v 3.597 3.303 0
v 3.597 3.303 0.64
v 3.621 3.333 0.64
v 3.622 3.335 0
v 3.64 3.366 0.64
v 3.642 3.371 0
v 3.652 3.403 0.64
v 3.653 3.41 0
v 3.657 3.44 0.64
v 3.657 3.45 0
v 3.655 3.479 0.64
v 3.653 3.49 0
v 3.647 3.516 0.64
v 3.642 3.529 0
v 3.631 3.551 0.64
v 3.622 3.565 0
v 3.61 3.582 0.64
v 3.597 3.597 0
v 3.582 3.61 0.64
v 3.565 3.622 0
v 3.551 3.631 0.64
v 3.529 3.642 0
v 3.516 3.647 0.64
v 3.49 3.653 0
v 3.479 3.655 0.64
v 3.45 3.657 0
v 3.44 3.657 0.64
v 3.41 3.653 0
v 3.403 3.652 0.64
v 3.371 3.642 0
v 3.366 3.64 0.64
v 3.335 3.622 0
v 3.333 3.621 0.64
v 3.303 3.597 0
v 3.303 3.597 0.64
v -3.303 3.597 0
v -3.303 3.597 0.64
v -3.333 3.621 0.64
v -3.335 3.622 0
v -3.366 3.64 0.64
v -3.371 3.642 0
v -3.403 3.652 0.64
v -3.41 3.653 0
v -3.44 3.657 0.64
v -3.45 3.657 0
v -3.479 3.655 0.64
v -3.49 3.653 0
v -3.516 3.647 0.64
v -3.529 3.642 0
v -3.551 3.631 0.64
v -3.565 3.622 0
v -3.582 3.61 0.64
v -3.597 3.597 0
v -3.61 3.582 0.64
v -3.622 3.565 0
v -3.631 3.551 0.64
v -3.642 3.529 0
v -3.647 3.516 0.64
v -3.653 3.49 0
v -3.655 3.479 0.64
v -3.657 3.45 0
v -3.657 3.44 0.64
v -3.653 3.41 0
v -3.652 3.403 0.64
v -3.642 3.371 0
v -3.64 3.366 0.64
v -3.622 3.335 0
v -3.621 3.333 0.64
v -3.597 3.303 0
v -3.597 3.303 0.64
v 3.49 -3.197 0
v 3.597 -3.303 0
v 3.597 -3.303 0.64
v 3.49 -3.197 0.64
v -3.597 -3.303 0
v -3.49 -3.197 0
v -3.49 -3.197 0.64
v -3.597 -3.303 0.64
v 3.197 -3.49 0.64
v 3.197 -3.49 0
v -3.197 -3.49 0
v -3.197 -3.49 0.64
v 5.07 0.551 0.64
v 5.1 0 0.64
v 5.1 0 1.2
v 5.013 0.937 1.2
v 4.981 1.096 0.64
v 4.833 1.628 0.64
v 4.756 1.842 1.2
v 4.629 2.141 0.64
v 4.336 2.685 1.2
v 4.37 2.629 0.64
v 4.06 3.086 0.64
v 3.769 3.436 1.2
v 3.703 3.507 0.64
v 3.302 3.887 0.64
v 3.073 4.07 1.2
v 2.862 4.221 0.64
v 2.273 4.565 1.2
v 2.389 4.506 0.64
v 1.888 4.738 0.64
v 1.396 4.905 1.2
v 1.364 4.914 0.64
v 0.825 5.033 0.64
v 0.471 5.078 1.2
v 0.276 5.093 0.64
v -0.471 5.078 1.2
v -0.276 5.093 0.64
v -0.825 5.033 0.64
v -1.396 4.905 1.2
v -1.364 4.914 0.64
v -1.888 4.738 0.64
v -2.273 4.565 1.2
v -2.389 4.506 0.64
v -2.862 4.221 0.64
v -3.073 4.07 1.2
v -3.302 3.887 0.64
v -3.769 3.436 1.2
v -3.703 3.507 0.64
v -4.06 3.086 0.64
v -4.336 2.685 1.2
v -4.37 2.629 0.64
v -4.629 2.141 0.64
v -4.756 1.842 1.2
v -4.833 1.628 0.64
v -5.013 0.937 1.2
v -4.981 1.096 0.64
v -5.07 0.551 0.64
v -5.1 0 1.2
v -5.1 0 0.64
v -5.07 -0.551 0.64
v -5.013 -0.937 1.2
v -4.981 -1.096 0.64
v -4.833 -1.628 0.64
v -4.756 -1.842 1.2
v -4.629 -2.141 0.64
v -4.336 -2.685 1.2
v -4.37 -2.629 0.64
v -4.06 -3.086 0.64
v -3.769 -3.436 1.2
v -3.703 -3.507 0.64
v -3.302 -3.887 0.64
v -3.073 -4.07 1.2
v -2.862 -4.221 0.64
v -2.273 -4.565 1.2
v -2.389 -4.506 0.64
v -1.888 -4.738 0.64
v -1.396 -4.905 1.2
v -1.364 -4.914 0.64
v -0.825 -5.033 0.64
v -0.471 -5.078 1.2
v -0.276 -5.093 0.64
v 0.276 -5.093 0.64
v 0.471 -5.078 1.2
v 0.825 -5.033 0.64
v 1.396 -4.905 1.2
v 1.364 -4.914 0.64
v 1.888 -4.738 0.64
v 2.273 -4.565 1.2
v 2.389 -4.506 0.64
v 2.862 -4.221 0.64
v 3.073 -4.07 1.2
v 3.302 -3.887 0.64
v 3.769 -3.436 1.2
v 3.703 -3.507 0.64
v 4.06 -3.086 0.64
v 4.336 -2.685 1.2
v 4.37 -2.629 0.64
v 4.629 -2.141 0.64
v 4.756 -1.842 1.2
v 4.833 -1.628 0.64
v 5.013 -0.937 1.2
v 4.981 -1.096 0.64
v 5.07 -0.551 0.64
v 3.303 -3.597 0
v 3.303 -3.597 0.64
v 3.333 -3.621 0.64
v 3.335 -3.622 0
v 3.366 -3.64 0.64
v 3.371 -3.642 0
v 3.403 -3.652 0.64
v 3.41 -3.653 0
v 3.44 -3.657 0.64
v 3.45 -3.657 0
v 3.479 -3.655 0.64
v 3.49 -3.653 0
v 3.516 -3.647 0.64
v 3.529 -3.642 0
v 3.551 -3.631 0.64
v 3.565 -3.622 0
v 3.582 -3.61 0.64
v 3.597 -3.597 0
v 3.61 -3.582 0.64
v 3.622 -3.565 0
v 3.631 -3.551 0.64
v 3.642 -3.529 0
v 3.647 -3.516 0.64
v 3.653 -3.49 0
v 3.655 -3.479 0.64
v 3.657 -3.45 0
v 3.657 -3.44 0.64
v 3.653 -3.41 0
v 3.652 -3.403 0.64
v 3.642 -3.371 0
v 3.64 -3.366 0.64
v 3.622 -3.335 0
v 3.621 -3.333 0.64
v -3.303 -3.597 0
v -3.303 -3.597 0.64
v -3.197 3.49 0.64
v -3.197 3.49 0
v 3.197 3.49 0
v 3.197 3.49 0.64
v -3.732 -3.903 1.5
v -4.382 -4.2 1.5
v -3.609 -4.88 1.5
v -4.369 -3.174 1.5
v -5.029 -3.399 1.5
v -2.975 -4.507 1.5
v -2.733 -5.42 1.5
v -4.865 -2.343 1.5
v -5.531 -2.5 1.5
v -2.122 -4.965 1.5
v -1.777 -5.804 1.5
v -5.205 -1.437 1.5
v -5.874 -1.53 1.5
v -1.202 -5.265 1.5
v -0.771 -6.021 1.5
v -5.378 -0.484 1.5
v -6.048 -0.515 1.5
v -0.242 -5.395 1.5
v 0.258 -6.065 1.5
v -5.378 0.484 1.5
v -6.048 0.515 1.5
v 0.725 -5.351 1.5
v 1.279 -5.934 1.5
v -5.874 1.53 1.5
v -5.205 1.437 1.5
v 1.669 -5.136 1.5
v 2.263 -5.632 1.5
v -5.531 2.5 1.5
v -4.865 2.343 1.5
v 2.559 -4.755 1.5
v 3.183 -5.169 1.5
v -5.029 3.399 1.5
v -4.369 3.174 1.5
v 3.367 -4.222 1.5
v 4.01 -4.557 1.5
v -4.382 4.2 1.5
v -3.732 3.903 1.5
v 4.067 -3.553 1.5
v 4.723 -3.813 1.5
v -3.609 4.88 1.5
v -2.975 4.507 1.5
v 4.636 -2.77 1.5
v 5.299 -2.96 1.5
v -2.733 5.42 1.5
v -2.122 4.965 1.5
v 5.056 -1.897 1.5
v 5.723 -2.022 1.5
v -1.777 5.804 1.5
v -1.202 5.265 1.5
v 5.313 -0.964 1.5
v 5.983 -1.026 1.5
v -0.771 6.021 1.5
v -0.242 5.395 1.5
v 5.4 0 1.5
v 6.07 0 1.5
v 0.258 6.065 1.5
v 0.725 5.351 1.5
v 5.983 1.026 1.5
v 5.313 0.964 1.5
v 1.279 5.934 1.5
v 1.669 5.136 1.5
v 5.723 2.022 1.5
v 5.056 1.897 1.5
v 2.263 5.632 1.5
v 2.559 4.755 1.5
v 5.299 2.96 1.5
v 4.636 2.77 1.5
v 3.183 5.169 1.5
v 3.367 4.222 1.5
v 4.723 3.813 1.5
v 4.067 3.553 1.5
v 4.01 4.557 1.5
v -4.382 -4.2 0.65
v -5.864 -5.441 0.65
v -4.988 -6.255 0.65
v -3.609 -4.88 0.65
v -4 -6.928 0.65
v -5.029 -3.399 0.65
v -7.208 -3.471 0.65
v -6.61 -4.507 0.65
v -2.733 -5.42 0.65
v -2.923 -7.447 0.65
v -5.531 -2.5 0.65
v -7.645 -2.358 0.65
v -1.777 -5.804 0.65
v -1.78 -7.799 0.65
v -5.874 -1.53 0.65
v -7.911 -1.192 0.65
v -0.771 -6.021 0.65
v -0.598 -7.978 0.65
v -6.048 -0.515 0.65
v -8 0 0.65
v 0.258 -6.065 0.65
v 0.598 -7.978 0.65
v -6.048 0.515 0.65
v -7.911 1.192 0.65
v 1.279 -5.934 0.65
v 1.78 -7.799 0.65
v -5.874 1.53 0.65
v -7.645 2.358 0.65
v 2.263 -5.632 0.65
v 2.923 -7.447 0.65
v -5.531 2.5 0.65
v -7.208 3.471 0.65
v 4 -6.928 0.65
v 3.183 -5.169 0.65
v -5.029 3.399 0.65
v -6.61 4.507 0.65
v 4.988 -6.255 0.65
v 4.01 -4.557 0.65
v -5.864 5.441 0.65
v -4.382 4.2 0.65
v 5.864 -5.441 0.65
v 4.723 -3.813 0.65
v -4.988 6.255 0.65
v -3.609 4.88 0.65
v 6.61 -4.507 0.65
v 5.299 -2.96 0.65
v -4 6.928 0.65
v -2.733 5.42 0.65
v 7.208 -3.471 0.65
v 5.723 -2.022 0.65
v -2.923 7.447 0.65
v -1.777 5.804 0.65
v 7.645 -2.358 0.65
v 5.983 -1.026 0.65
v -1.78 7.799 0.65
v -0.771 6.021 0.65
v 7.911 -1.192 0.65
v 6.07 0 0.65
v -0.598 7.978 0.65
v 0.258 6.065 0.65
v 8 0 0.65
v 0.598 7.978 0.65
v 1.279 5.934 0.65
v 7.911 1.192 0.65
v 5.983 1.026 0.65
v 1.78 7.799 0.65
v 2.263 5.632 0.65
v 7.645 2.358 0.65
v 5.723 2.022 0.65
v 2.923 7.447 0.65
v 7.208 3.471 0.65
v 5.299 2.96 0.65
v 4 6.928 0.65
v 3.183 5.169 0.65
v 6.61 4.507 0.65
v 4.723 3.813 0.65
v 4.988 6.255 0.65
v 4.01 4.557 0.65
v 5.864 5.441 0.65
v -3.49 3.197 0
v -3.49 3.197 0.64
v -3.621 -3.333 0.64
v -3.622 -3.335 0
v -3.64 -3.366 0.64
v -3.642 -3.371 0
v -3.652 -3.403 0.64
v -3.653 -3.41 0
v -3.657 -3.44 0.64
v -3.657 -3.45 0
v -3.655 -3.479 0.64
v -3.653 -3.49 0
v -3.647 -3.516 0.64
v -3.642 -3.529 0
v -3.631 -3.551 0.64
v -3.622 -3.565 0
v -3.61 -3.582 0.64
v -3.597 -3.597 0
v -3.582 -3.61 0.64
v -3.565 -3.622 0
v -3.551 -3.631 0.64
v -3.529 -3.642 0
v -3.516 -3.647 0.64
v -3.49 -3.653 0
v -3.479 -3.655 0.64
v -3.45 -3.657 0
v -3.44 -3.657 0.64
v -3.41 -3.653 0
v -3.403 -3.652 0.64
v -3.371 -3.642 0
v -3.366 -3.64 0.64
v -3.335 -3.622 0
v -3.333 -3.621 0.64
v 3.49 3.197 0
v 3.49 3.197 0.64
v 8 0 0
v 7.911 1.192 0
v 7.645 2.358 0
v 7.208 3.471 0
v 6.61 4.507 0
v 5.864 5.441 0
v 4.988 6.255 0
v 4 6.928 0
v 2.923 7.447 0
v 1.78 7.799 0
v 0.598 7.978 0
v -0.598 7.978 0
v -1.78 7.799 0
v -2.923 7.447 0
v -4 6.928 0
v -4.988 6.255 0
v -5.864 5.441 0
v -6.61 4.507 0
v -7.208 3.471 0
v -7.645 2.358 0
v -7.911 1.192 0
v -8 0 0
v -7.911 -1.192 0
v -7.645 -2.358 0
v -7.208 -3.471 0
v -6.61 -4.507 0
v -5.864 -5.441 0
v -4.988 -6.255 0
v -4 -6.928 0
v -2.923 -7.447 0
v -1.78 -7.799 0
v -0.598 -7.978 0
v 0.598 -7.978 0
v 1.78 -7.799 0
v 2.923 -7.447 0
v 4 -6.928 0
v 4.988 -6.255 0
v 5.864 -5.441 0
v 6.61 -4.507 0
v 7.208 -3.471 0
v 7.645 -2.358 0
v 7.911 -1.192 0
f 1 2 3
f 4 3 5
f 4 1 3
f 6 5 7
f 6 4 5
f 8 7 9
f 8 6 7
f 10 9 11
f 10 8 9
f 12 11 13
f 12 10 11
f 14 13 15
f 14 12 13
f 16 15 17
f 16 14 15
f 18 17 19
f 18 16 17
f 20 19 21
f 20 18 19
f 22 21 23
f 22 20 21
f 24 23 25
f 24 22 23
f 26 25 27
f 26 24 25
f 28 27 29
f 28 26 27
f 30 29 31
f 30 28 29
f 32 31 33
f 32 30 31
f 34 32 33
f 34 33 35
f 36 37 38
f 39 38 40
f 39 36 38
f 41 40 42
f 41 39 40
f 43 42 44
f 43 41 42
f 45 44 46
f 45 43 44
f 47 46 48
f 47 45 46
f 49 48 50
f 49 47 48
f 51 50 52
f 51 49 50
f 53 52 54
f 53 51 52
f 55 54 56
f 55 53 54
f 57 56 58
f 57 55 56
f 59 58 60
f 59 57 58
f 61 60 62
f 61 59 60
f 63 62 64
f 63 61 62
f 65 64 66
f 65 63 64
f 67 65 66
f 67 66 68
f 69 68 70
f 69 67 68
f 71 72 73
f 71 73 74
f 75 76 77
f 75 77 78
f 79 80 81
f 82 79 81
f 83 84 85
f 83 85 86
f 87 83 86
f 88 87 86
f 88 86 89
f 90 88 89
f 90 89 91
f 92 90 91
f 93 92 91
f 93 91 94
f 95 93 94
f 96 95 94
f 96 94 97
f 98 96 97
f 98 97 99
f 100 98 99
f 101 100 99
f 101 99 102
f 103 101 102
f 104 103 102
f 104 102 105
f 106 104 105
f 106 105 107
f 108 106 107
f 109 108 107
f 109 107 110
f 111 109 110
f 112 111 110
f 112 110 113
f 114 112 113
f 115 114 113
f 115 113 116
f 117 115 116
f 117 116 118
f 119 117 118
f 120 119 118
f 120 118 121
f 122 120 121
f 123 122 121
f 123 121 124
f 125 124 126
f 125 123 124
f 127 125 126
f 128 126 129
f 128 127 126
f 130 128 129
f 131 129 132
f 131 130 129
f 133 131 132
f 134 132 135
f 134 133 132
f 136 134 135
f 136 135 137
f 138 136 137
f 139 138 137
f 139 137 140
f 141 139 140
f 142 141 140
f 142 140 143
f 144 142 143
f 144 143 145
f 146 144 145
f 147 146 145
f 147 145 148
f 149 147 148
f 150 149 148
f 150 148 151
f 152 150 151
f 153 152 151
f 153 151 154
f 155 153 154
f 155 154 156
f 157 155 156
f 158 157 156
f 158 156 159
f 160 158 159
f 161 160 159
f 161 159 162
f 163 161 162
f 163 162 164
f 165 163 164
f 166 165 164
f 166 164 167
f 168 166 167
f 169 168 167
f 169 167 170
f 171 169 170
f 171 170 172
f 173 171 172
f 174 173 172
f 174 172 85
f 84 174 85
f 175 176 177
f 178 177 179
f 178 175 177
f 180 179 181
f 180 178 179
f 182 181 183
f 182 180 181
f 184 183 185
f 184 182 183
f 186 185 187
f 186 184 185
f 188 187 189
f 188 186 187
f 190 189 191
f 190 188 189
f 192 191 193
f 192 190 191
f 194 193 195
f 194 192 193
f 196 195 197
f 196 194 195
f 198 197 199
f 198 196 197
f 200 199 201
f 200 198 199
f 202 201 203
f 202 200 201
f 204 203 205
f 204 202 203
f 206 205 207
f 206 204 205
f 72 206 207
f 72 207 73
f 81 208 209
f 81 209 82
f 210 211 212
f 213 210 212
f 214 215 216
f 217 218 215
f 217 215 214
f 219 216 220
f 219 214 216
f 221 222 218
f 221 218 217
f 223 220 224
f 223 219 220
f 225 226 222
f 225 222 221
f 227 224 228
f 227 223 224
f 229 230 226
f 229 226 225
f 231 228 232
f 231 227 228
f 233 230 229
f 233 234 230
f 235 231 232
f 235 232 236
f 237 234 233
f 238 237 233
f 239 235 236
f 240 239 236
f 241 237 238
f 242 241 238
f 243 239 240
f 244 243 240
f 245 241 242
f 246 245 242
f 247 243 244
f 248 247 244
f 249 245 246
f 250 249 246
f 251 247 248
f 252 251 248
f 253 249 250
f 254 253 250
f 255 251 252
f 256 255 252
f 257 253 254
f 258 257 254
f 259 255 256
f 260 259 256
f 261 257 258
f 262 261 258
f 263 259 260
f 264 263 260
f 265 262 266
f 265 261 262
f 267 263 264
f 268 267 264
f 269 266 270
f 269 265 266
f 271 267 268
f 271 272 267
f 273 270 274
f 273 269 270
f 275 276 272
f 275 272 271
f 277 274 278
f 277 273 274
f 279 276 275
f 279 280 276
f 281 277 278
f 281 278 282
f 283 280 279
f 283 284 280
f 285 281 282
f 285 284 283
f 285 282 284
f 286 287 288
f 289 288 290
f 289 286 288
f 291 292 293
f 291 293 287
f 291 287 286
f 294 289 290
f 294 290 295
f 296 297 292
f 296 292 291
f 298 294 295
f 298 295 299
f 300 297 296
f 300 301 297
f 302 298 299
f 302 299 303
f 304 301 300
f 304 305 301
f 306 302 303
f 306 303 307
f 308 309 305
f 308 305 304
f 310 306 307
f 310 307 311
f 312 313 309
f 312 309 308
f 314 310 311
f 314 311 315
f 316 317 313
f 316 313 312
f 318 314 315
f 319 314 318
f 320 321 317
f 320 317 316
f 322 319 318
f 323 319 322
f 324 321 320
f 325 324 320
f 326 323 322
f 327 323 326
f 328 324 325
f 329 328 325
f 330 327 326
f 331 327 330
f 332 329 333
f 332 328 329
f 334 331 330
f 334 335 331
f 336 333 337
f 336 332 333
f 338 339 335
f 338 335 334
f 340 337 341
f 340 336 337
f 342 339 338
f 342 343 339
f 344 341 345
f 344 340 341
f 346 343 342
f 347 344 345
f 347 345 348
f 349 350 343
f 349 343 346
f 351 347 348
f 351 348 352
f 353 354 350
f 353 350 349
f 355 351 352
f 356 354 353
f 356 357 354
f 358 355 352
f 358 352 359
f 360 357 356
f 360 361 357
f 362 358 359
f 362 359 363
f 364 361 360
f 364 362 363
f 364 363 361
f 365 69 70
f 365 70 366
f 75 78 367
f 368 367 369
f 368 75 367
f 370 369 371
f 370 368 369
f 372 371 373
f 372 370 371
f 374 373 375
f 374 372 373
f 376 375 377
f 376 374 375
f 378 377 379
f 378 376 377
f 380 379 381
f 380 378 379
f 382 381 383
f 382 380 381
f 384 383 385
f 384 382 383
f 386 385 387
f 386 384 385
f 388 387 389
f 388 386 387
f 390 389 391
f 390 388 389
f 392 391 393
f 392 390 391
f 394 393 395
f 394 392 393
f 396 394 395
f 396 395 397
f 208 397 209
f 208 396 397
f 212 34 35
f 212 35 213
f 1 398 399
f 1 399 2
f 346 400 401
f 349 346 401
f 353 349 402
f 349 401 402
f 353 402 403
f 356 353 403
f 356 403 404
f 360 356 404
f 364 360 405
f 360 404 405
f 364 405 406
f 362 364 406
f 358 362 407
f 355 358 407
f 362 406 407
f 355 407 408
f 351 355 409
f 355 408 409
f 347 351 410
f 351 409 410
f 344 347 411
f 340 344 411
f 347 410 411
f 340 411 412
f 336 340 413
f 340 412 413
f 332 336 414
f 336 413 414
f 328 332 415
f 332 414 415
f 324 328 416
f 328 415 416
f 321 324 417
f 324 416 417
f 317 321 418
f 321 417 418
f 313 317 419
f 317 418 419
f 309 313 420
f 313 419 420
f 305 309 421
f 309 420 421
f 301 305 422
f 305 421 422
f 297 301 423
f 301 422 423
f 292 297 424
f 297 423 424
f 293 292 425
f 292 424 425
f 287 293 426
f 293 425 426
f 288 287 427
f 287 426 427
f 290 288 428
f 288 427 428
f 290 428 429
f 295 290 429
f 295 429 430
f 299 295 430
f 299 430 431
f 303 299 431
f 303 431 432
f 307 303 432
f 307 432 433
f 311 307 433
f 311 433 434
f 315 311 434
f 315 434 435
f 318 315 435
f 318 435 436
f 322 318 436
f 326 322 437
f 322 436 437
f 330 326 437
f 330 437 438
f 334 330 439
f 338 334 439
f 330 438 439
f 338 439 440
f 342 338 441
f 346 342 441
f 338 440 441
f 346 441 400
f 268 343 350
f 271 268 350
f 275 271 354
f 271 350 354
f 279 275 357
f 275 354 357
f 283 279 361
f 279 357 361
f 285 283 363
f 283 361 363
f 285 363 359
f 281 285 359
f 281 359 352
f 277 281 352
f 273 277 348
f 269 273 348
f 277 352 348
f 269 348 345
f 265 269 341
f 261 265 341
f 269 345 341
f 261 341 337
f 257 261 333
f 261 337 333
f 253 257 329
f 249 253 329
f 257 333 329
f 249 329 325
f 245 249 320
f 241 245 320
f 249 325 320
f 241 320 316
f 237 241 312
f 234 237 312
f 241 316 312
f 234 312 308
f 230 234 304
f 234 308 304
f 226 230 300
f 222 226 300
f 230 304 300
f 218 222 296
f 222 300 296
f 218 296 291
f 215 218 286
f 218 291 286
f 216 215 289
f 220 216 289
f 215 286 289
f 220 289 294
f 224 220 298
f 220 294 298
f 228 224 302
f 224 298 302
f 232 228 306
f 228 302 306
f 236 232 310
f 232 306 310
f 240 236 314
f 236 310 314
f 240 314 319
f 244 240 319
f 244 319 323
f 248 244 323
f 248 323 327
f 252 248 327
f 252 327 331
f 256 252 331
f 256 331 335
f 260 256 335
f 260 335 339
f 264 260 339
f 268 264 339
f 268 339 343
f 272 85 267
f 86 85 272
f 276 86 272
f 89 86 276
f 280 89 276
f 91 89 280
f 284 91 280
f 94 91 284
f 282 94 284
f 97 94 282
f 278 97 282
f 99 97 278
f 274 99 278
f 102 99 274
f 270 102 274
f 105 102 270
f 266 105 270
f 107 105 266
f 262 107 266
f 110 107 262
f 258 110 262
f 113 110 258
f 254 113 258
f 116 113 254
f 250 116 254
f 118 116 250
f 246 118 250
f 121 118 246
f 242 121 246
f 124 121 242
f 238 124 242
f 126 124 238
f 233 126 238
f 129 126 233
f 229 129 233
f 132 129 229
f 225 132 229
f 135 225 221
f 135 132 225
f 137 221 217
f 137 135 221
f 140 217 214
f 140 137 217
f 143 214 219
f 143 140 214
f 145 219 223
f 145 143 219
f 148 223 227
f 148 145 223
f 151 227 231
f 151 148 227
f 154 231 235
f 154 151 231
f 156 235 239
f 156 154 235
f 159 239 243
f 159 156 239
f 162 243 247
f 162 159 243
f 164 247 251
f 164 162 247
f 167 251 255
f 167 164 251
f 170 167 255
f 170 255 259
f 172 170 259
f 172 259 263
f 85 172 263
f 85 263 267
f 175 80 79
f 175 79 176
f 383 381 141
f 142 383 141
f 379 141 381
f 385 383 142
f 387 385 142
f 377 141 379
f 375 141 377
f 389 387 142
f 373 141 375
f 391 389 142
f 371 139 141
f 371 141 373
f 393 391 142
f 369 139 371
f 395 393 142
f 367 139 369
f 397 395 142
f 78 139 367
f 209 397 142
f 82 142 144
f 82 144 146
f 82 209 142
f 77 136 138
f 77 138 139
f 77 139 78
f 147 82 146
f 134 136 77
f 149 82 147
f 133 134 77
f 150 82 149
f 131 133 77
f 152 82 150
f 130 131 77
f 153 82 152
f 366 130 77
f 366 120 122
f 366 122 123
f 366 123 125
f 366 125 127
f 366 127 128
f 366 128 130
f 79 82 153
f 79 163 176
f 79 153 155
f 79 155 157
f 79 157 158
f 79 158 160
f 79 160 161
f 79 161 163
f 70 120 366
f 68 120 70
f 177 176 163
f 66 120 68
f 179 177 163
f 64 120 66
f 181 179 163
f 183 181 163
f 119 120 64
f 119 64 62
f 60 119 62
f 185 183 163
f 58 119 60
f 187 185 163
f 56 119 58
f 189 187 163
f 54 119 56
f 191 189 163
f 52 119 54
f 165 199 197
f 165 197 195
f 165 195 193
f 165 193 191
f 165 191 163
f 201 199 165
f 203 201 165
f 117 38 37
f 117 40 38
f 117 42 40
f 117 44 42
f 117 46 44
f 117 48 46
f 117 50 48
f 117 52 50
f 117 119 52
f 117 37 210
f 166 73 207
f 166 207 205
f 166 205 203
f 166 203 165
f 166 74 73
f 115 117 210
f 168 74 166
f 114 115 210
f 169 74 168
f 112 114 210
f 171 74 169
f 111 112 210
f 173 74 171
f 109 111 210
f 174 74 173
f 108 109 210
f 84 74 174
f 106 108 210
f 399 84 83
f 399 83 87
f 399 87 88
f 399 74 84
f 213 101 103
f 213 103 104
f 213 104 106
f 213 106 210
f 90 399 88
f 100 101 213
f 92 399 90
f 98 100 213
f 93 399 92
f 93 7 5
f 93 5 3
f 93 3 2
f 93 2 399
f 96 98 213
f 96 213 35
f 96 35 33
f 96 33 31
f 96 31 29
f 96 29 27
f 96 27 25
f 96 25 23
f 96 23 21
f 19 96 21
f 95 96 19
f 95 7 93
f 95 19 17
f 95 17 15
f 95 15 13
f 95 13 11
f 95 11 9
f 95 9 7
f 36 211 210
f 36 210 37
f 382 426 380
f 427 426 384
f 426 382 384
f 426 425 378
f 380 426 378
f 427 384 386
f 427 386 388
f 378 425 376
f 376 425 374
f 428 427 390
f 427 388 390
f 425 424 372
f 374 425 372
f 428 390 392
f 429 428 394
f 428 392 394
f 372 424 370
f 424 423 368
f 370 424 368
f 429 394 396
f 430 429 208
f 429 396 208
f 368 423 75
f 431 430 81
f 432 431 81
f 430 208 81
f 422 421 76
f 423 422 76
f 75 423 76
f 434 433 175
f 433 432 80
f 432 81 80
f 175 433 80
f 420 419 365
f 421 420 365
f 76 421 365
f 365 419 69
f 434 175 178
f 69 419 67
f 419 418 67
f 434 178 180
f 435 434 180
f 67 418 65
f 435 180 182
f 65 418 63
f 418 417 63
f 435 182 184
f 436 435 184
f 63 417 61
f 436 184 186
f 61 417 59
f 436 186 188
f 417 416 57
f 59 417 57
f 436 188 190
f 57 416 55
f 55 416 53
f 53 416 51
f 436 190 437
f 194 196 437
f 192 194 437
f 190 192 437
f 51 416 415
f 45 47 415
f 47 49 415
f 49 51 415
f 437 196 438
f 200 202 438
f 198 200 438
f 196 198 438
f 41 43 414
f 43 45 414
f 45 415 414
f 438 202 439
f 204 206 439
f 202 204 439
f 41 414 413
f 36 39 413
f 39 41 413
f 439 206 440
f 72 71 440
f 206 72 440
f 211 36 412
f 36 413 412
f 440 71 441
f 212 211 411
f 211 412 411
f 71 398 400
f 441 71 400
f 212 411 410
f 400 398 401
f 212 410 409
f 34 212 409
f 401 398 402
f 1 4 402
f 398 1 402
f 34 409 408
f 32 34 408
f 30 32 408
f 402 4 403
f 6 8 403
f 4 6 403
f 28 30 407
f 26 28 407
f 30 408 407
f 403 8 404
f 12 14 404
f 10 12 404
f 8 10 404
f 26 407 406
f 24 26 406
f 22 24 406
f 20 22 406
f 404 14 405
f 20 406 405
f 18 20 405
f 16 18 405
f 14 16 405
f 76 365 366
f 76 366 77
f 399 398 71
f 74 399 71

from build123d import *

# Parameters (mm, degrees)
SKETCH_1_R          = 8
EXTRUDE_1_DEPTH     = 0.65
EXTRUDE_START       = 0.65
SKETCH_2_R          = 6.07
SKETCH_2_R_2        = 5.1
EXTRUDE_2_DEPTH     = 0.85
CUT_EXTRUDE_START   = 0.65
SKETCH_3_R          = 5.1
CUT_EXTRUDE_1_DEPTH = 0.01
CUT_EXTRUDE_2_DEPTH = 0.64
CHAMFER_1_SIZE      = 0.3
SKETCH_6_R          = 0.207363545
CUT_EXTRUDE_3_DEPTH = 0.64
CUT_EXTRUDE_4_DEPTH = 0.64


with BuildPart() as part:
    # 草图1 → 凸台-拉伸1 (new body)
    with BuildSketch(Plane.XY):
        Circle(SKETCH_1_R)
    extrude(amount=EXTRUDE_1_DEPTH)

    # 草图2 → 凸台-拉伸2 (add)
    with BuildSketch(Plane.XY.offset(EXTRUDE_START)):
        Circle(SKETCH_2_R)
        Circle(SKETCH_2_R_2, mode=Mode.SUBTRACT)
    extrude(amount=EXTRUDE_2_DEPTH)

    # 草图3 → 切除-拉伸1 (cut)
    with BuildSketch(Plane.XY.offset(CUT_EXTRUDE_START)):
        Circle(SKETCH_3_R)
    extrude(amount=-CUT_EXTRUDE_1_DEPTH, mode=Mode.SUBTRACT)

    # 草图4 → 切除-拉伸2 (cut)
    with BuildSketch(Plane.XY):
        Polygon((-3.49, 0), (-3.49, 3.49), (3.49, 3.49), (3.49, -3.49), (-3.49, -3.49), align=None)
    extrude(amount=CUT_EXTRUDE_2_DEPTH, mode=Mode.SUBTRACT)

    # 倒角1
    chamfer_1_edges = [part.edges().sort_by_distance(p)[0] for p in [
        (-5.1, 0, 1.5),
    ]]
    chamfer(chamfer_1_edges, length=CHAMFER_1_SIZE)

    # 草图6 → 切除-拉伸3 (cut)
    with BuildSketch(Plane.XY):
        with Locations((-3.45, 3.45)):
            Circle(SKETCH_6_R)
        with Locations((3.45, 3.45)):
            Circle(SKETCH_6_R)
        with Locations((3.45, -3.45)):
            Circle(SKETCH_6_R)
        with Locations((-3.45, -3.45)):
            Circle(SKETCH_6_R)
    extrude(amount=CUT_EXTRUDE_3_DEPTH, mode=Mode.SUBTRACT)

    # 草图7 → 切除-拉伸4 (cut)
    with BuildSketch(Plane.XY):
        Polygon((-3.45, 3.45), (-3.596628169, 3.303371831), (-3.126421006, 2.833164668), (-2.833164668, 3.126421006), (-3.303371831, 3.596628169), align=None)
        Polygon((2.833164668, 3.126421006), (3.126421006, 2.833164668), (3.596628169, 3.303371831), (3.45, 3.45), (3.303371831, 3.596628169), align=None)
        Polygon((3.45, -3.45), (3.596628169, -3.303371831), (3.126421006, -2.833164668), (2.833164668, -3.126421006), (3.303371831, -3.596628169), align=None)
        Polygon((-2.833164668, -3.126421006), (-3.126421006, -2.833164668), (-3.596628169, -3.303371831), (-3.45, -3.45), (-3.303371831, -3.596628169), align=None)
    extrude(amount=CUT_EXTRUDE_4_DEPTH, mode=Mode.SUBTRACT)


solid = part.part
